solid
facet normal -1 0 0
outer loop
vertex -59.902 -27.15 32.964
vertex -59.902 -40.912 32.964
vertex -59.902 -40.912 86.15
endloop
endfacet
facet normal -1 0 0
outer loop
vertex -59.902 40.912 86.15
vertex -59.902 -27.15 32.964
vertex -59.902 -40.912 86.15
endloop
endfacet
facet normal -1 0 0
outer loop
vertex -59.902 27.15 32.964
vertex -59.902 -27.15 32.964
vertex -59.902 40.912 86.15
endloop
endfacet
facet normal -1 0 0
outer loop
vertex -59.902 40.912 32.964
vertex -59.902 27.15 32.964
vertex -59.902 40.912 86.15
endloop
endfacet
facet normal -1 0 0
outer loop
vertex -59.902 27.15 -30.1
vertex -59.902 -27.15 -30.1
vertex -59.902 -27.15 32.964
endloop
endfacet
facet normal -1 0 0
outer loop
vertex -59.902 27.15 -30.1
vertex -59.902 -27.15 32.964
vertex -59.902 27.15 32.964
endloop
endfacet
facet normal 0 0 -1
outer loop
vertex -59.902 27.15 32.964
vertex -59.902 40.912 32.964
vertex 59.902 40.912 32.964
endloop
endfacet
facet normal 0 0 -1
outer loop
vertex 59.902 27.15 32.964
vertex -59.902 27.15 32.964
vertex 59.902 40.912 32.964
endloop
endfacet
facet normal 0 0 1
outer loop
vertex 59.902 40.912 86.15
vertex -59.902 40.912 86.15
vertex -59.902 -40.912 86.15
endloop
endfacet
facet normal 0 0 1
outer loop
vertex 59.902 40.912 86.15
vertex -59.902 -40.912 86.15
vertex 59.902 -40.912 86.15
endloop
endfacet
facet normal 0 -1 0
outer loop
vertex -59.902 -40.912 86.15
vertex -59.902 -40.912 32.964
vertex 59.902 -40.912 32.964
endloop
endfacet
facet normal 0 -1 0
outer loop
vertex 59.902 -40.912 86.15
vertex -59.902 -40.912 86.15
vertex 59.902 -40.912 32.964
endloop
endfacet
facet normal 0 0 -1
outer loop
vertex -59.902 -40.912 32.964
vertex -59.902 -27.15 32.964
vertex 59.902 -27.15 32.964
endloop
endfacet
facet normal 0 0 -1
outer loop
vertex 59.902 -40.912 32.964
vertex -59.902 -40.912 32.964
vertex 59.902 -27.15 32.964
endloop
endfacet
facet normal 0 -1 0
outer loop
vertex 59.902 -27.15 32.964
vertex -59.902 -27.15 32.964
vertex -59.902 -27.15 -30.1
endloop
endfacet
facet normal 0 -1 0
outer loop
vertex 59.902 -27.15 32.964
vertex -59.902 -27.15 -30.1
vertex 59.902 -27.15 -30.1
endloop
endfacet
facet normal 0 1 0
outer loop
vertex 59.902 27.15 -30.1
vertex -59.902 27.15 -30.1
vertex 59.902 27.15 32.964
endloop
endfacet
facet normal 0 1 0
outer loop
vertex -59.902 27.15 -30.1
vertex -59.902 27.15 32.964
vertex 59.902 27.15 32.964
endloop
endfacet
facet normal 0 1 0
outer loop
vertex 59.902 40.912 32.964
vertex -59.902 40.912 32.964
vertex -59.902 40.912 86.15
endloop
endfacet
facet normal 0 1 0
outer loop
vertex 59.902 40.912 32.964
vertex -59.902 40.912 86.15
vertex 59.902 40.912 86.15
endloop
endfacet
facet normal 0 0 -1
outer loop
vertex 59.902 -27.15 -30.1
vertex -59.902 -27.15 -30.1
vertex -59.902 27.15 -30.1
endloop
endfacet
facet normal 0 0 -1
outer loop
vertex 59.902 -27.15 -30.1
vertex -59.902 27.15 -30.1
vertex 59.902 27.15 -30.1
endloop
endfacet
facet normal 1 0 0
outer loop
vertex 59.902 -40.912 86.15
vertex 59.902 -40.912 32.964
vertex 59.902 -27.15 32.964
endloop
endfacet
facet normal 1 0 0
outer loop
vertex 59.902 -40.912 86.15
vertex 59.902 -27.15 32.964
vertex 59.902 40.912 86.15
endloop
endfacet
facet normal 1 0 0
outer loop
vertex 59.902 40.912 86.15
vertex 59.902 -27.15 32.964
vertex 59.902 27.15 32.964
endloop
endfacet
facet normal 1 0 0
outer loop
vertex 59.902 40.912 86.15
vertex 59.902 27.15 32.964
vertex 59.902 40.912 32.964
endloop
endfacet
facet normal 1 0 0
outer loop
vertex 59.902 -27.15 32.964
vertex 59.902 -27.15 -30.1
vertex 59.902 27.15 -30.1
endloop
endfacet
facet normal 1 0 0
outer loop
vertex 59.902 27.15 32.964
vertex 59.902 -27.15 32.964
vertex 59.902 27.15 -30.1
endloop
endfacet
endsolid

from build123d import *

# Parameters (mm, degrees)
F0_W      = 119.803108
F0_H      = 54.300458
F1_DEPTH  = 32.96413
F1_FACE_W = 119.803108
F1_FACE_H = 54.300458
F2_DEPTH  = 30.10031
F3_W      = 119.803108
F3_H      = 81.823676
F4_DEPTH  = 53.18567


with BuildPart() as f1:
    # F0 (on Top) → F1 (new body)
    with BuildSketch(Plane.XY):
        Rectangle(F0_W, F0_H)
    extrude(amount=F1_DEPTH)

    # F1_face (on face) → F2 (join)
    with BuildSketch(Plane(origin=(0, 0, 0), x_dir=(1, 0, 0), z_dir=(0, 0, -1))):
        Rectangle(F1_FACE_W, F1_FACE_H)
    extrude(amount=F2_DEPTH)

    # F3 (on face) → F4 (join)
    with BuildSketch(Plane.XY.offset(32.96413)):
        Rectangle(F3_W, F3_H)
    extrude(amount=F4_DEPTH)


solid = f1.part
